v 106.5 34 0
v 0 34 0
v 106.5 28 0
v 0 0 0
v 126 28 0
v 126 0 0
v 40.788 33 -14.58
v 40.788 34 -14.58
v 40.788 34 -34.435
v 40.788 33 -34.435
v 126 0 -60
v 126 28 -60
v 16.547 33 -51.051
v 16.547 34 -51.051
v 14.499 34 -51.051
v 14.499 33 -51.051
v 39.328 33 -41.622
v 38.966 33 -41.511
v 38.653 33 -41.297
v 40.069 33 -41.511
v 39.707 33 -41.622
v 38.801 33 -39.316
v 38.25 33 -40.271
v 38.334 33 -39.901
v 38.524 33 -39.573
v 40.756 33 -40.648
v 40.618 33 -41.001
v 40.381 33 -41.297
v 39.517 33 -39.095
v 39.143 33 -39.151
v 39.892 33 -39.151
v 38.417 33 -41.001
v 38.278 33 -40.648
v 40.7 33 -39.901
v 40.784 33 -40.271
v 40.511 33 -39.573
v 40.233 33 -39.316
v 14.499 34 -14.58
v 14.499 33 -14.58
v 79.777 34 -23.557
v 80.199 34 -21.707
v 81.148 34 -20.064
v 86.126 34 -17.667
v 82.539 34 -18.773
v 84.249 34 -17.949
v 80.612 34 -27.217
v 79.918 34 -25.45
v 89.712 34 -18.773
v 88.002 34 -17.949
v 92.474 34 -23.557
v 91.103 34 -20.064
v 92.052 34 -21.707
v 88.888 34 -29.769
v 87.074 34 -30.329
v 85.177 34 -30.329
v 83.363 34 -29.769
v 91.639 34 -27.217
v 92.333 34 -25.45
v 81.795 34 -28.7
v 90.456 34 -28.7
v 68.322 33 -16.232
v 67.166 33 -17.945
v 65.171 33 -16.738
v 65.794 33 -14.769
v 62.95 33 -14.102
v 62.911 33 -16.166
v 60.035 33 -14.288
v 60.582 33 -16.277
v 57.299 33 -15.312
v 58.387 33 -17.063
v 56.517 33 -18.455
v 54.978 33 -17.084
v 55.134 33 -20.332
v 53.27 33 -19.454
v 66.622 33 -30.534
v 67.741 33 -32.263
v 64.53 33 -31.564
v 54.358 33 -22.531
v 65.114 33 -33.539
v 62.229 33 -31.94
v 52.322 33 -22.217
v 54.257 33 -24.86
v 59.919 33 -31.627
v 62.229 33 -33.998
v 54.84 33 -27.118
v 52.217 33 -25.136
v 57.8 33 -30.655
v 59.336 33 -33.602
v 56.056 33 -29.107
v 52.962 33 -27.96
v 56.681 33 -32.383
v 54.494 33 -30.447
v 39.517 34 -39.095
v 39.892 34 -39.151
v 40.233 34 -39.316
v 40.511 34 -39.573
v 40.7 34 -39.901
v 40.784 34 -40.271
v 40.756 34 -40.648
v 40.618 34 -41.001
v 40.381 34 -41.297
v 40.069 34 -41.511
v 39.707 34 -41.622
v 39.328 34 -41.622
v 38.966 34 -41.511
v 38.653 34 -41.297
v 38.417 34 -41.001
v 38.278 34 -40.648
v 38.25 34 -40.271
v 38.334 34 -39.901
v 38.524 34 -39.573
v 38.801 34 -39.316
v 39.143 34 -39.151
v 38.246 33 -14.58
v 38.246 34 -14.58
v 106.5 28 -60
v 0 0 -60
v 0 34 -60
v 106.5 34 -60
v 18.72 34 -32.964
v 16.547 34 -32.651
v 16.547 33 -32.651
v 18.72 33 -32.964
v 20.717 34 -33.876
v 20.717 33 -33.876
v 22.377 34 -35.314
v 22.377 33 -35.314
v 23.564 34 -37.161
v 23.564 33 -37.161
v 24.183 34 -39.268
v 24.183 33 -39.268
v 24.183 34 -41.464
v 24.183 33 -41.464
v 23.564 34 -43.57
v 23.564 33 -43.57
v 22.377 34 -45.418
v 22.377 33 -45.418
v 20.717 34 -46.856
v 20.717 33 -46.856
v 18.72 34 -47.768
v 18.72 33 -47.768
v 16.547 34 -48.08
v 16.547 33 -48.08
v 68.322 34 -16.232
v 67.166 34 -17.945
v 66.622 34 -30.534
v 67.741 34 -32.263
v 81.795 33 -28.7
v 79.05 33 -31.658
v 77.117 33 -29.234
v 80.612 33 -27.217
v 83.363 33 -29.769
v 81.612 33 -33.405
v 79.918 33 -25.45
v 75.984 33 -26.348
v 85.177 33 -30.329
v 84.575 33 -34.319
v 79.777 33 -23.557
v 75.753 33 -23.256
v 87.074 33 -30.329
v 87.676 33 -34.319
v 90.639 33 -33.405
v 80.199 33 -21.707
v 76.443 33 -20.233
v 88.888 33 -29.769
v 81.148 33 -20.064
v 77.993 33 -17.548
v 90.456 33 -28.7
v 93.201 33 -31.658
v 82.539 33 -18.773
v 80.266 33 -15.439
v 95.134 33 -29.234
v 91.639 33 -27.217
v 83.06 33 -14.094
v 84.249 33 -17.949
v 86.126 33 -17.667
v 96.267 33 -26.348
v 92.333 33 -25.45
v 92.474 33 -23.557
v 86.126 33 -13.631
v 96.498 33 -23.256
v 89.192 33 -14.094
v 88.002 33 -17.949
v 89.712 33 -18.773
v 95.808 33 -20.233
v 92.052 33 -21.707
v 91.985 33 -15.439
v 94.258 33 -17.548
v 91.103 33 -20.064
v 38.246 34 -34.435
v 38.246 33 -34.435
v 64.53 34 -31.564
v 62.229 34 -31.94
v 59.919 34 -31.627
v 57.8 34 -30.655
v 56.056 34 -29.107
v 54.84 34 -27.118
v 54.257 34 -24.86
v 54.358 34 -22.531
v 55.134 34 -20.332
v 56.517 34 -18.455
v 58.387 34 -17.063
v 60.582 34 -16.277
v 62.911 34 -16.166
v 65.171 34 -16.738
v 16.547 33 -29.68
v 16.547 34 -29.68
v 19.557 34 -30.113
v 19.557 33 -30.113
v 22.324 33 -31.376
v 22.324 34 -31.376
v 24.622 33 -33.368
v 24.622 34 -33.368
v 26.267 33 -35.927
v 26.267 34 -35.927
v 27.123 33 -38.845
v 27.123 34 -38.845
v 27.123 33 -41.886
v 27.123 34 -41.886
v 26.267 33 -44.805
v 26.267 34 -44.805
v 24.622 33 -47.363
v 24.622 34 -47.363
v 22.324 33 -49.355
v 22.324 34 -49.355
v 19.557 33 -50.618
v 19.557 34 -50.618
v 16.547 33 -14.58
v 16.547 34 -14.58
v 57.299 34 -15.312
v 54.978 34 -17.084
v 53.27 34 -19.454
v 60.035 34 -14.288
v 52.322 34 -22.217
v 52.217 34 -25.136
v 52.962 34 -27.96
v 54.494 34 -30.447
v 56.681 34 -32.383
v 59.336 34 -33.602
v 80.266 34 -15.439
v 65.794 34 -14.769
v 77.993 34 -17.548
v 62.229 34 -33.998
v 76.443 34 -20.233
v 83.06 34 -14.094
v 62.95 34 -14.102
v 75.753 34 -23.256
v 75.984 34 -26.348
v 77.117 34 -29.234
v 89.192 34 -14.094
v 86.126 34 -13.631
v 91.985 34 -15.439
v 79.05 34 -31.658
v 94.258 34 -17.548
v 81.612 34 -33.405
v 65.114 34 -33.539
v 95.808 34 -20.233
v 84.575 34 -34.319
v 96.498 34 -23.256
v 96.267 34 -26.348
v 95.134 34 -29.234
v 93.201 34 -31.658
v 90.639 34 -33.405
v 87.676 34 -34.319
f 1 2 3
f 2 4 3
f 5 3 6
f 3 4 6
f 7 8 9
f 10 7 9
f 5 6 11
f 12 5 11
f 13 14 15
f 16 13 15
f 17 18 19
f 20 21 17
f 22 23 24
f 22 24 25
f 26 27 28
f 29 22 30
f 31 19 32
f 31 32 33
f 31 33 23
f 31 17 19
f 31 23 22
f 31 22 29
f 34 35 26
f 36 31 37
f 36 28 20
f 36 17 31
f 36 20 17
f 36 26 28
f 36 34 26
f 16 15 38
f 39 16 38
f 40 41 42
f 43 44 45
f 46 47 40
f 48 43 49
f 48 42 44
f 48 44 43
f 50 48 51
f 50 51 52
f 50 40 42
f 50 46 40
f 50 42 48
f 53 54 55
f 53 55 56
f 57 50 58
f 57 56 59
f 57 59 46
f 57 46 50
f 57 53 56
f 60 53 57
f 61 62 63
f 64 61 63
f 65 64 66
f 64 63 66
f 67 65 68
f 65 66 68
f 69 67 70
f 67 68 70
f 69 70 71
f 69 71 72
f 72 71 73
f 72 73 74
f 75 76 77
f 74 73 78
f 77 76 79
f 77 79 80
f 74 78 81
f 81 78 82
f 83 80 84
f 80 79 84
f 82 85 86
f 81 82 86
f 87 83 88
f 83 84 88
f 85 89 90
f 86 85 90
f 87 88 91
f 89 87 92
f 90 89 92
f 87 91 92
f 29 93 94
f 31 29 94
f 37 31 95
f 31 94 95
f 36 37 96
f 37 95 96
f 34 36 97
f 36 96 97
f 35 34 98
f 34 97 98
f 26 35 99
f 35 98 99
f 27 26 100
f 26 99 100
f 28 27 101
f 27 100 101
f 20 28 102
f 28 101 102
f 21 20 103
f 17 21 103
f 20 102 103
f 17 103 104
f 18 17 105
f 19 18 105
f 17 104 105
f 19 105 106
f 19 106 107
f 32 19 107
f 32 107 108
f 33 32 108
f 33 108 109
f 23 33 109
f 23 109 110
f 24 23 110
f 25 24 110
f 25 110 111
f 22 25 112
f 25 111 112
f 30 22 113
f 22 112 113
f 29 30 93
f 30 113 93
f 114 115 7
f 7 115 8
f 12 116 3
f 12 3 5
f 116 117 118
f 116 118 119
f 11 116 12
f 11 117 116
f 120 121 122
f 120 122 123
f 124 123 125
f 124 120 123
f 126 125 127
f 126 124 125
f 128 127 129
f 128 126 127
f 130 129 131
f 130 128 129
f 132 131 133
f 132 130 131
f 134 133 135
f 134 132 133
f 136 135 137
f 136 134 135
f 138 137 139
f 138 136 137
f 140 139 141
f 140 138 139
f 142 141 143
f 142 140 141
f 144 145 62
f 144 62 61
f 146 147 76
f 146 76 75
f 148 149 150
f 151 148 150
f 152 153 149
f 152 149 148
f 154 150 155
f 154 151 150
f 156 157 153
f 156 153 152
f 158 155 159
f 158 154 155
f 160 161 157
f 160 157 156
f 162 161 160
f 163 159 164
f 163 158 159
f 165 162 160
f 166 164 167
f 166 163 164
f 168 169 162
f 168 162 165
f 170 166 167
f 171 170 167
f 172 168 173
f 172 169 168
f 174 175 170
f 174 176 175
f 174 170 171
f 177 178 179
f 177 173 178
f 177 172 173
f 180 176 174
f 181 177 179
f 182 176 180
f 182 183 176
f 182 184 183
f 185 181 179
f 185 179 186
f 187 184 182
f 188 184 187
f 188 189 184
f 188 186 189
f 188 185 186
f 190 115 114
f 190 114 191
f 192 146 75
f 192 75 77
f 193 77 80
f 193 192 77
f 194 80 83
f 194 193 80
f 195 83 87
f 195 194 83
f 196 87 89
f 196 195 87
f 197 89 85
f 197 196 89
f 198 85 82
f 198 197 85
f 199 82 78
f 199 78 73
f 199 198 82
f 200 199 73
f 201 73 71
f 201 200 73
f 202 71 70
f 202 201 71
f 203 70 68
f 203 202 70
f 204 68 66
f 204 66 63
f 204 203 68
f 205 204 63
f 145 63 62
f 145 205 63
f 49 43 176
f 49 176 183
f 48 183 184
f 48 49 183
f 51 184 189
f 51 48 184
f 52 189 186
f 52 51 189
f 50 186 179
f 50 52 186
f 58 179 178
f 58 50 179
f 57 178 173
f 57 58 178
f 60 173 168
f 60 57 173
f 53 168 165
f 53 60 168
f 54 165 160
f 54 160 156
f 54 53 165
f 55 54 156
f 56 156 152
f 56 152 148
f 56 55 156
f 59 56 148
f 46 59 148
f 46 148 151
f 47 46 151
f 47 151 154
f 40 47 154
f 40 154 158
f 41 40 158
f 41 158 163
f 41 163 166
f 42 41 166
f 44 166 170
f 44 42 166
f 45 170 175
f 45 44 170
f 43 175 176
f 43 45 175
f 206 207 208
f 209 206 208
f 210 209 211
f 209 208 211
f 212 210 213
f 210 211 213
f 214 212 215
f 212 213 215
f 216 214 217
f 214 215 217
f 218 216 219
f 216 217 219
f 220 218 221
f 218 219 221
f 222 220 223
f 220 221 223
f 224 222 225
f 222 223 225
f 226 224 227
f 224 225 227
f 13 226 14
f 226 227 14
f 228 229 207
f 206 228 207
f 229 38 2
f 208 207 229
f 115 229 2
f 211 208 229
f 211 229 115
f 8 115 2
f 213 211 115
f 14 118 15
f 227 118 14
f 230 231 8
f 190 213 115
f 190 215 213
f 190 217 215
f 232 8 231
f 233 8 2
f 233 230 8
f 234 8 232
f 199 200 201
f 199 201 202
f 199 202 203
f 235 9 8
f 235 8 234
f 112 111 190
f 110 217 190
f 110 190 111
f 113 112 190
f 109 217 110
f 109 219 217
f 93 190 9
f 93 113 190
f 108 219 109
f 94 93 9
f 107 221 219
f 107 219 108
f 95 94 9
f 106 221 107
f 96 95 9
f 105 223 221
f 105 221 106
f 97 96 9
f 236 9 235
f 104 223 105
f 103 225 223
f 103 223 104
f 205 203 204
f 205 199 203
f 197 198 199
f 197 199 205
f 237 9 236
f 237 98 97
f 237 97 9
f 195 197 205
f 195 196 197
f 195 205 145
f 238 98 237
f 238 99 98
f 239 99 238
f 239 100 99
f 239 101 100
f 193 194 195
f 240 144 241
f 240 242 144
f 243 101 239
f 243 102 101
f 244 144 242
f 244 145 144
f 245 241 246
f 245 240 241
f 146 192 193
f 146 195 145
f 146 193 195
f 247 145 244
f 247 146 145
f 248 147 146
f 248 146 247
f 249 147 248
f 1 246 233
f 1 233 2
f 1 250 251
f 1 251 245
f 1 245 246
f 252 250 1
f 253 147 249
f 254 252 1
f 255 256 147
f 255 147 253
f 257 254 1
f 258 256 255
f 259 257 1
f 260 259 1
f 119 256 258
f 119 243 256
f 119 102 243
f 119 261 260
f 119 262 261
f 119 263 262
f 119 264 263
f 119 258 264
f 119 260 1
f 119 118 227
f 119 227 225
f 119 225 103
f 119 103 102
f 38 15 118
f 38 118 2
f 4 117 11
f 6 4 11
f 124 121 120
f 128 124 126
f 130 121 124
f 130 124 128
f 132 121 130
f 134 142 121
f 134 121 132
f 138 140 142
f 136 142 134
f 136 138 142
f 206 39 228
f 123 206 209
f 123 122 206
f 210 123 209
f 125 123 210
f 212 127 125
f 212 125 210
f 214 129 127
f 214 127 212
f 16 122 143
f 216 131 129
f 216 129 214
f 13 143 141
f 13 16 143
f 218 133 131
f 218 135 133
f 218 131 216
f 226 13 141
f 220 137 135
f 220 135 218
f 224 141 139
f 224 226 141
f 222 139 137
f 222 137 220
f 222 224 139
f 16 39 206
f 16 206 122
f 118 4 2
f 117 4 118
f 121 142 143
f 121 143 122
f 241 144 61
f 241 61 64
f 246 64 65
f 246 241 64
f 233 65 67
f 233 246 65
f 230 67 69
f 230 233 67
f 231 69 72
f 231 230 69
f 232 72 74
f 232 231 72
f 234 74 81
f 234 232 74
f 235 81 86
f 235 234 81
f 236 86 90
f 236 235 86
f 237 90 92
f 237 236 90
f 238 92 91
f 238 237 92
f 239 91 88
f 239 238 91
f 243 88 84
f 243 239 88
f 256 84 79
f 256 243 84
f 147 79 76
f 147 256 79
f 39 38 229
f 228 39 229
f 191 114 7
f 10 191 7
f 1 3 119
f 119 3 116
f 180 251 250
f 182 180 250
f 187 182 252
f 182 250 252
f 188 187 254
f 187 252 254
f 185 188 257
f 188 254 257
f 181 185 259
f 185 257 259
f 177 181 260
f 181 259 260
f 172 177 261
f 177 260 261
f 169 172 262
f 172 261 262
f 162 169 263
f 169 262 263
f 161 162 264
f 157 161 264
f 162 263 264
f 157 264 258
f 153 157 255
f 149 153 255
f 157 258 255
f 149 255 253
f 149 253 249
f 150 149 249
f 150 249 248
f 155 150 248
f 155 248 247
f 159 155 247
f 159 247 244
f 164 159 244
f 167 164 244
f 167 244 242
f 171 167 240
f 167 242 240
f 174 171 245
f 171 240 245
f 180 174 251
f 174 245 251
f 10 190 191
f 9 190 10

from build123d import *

# Parameters (mm, degrees)
SKETCH1_W           = 126
SKETCH1_H           = 60
BOSS_EXTRUDE1_DEPTH = 28
SKETCH2_W           = 106.5
SKETCH2_H           = 60
BOSS_EXTRUDE2_DEPTH = 6
SKETCH3_R           = 1.270837117
SKETCH3_R_2         = 10.401878768
SKETCH3_R_3         = 6.366682124
SKETCH3_W           = 2.541674233
SKETCH3_H           = 19.855616704
CUT_EXTRUDE1_DEPTH  = 1


with BuildPart() as part:
    # Sketch1 → Boss-Extrude1 (new body)
    with BuildSketch(Plane(origin=(0, 0, 0), x_dir=(1, 0, 0), z_dir=(0, 1, 0))):
        with Locations((63, 30)):
            Rectangle(SKETCH1_W, SKETCH1_H)
    extrude(amount=BOSS_EXTRUDE1_DEPTH)

    # Sketch2 → Boss-Extrude2 (add)
    with BuildSketch(Plane(origin=(0, 28, 0), x_dir=(1, 0, 0), z_dir=(0, 1, 0))):
        with Locations((53.25, 30)):
            Rectangle(SKETCH2_W, SKETCH2_H)
    extrude(amount=BOSS_EXTRUDE2_DEPTH)

    # Sketch3 → Cut-Extrude1 (cut)
    # profile 1 of 5: a face of its own
    with BuildSketch(Plane(origin=(0, 34, 0), x_dir=(1, 0, 0), z_dir=(0, 1, 0))):
        with Locations(Location((39.51710712, 40.365620358, 0), (0, 0, 270))):
            Circle(SKETCH3_R)
    # profile 2 of 5: a face of its own
    with BuildSketch(Plane(origin=(0, 34, 0), x_dir=(1, 0, 0), z_dir=(0, 1, 0))):
        with Locations(Location((86.125525447, 24.033278021, 0), (0, 0, 270))):
            Circle(SKETCH3_R_2)
        with Locations(Location((86.125525447, 24.033278021, 0), (0, 0, 270))):
            Circle(SKETCH3_R_3, mode=Mode.SUBTRACT)
    # profile 3 of 5: a face of its own
    with BuildSketch(Plane(origin=(0, 34, 0), x_dir=(1, 0, 0), z_dir=(0, 1, 0))):
        with BuildLine():
            Line((14.499134375, 40.429605669), (14.499134375, 14.579540085))
            Line((14.499134375, 14.579540085), (16.546664322, 14.579540085))
            Line((16.546664322, 14.579540085), (16.546664322, 29.680073446))
            ThreePointArc((16.546664322, 29.680073446), (27.232211234, 40.365620358), (16.546664322, 51.05116727))
            Line((16.546664322, 51.05116727), (14.499134375, 51.05116727))
            Line((14.499134375, 51.05116727), (14.499134375, 40.429605669))
        make_face()
        with BuildLine():
            Line((16.546664322, 48.080160925), (16.546664322, 32.651079791))
            ThreePointArc((16.546664322, 32.651079791), (24.26120489, 40.365620358), (16.546664322, 48.080160925))
        make_face(mode=Mode.SUBTRACT)
    # profile 4 of 5: a face of its own
    with BuildSketch(Plane(origin=(0, 34, 0), x_dir=(1, 0, 0), z_dir=(0, 1, 0))):
        with Locations((39.517107119, 24.507348437)):
            Rectangle(SKETCH3_W, SKETCH3_H)
    # profile 5 of 5: a face of its own
    with BuildSketch(Plane(origin=(0, 34, 0), x_dir=(1, 0, 0), z_dir=(0, 1, 0))):
        with BuildLine():
            Line((67.74148212, 32.262991734), (66.622002756, 30.534452251))
            ThreePointArc((66.622002756, 30.534452251), (54.221440679, 23.691888532), (67.166075127, 17.944623349))
            Line((67.166075127, 17.944623349), (68.322309862, 16.231868944))
            ThreePointArc((68.322309862, 16.231868944), (52.161989467, 23.672443665), (67.74148212, 32.262991734))
        make_face()
    extrude(amount=-CUT_EXTRUDE1_DEPTH, mode=Mode.SUBTRACT)


solid = part.part
